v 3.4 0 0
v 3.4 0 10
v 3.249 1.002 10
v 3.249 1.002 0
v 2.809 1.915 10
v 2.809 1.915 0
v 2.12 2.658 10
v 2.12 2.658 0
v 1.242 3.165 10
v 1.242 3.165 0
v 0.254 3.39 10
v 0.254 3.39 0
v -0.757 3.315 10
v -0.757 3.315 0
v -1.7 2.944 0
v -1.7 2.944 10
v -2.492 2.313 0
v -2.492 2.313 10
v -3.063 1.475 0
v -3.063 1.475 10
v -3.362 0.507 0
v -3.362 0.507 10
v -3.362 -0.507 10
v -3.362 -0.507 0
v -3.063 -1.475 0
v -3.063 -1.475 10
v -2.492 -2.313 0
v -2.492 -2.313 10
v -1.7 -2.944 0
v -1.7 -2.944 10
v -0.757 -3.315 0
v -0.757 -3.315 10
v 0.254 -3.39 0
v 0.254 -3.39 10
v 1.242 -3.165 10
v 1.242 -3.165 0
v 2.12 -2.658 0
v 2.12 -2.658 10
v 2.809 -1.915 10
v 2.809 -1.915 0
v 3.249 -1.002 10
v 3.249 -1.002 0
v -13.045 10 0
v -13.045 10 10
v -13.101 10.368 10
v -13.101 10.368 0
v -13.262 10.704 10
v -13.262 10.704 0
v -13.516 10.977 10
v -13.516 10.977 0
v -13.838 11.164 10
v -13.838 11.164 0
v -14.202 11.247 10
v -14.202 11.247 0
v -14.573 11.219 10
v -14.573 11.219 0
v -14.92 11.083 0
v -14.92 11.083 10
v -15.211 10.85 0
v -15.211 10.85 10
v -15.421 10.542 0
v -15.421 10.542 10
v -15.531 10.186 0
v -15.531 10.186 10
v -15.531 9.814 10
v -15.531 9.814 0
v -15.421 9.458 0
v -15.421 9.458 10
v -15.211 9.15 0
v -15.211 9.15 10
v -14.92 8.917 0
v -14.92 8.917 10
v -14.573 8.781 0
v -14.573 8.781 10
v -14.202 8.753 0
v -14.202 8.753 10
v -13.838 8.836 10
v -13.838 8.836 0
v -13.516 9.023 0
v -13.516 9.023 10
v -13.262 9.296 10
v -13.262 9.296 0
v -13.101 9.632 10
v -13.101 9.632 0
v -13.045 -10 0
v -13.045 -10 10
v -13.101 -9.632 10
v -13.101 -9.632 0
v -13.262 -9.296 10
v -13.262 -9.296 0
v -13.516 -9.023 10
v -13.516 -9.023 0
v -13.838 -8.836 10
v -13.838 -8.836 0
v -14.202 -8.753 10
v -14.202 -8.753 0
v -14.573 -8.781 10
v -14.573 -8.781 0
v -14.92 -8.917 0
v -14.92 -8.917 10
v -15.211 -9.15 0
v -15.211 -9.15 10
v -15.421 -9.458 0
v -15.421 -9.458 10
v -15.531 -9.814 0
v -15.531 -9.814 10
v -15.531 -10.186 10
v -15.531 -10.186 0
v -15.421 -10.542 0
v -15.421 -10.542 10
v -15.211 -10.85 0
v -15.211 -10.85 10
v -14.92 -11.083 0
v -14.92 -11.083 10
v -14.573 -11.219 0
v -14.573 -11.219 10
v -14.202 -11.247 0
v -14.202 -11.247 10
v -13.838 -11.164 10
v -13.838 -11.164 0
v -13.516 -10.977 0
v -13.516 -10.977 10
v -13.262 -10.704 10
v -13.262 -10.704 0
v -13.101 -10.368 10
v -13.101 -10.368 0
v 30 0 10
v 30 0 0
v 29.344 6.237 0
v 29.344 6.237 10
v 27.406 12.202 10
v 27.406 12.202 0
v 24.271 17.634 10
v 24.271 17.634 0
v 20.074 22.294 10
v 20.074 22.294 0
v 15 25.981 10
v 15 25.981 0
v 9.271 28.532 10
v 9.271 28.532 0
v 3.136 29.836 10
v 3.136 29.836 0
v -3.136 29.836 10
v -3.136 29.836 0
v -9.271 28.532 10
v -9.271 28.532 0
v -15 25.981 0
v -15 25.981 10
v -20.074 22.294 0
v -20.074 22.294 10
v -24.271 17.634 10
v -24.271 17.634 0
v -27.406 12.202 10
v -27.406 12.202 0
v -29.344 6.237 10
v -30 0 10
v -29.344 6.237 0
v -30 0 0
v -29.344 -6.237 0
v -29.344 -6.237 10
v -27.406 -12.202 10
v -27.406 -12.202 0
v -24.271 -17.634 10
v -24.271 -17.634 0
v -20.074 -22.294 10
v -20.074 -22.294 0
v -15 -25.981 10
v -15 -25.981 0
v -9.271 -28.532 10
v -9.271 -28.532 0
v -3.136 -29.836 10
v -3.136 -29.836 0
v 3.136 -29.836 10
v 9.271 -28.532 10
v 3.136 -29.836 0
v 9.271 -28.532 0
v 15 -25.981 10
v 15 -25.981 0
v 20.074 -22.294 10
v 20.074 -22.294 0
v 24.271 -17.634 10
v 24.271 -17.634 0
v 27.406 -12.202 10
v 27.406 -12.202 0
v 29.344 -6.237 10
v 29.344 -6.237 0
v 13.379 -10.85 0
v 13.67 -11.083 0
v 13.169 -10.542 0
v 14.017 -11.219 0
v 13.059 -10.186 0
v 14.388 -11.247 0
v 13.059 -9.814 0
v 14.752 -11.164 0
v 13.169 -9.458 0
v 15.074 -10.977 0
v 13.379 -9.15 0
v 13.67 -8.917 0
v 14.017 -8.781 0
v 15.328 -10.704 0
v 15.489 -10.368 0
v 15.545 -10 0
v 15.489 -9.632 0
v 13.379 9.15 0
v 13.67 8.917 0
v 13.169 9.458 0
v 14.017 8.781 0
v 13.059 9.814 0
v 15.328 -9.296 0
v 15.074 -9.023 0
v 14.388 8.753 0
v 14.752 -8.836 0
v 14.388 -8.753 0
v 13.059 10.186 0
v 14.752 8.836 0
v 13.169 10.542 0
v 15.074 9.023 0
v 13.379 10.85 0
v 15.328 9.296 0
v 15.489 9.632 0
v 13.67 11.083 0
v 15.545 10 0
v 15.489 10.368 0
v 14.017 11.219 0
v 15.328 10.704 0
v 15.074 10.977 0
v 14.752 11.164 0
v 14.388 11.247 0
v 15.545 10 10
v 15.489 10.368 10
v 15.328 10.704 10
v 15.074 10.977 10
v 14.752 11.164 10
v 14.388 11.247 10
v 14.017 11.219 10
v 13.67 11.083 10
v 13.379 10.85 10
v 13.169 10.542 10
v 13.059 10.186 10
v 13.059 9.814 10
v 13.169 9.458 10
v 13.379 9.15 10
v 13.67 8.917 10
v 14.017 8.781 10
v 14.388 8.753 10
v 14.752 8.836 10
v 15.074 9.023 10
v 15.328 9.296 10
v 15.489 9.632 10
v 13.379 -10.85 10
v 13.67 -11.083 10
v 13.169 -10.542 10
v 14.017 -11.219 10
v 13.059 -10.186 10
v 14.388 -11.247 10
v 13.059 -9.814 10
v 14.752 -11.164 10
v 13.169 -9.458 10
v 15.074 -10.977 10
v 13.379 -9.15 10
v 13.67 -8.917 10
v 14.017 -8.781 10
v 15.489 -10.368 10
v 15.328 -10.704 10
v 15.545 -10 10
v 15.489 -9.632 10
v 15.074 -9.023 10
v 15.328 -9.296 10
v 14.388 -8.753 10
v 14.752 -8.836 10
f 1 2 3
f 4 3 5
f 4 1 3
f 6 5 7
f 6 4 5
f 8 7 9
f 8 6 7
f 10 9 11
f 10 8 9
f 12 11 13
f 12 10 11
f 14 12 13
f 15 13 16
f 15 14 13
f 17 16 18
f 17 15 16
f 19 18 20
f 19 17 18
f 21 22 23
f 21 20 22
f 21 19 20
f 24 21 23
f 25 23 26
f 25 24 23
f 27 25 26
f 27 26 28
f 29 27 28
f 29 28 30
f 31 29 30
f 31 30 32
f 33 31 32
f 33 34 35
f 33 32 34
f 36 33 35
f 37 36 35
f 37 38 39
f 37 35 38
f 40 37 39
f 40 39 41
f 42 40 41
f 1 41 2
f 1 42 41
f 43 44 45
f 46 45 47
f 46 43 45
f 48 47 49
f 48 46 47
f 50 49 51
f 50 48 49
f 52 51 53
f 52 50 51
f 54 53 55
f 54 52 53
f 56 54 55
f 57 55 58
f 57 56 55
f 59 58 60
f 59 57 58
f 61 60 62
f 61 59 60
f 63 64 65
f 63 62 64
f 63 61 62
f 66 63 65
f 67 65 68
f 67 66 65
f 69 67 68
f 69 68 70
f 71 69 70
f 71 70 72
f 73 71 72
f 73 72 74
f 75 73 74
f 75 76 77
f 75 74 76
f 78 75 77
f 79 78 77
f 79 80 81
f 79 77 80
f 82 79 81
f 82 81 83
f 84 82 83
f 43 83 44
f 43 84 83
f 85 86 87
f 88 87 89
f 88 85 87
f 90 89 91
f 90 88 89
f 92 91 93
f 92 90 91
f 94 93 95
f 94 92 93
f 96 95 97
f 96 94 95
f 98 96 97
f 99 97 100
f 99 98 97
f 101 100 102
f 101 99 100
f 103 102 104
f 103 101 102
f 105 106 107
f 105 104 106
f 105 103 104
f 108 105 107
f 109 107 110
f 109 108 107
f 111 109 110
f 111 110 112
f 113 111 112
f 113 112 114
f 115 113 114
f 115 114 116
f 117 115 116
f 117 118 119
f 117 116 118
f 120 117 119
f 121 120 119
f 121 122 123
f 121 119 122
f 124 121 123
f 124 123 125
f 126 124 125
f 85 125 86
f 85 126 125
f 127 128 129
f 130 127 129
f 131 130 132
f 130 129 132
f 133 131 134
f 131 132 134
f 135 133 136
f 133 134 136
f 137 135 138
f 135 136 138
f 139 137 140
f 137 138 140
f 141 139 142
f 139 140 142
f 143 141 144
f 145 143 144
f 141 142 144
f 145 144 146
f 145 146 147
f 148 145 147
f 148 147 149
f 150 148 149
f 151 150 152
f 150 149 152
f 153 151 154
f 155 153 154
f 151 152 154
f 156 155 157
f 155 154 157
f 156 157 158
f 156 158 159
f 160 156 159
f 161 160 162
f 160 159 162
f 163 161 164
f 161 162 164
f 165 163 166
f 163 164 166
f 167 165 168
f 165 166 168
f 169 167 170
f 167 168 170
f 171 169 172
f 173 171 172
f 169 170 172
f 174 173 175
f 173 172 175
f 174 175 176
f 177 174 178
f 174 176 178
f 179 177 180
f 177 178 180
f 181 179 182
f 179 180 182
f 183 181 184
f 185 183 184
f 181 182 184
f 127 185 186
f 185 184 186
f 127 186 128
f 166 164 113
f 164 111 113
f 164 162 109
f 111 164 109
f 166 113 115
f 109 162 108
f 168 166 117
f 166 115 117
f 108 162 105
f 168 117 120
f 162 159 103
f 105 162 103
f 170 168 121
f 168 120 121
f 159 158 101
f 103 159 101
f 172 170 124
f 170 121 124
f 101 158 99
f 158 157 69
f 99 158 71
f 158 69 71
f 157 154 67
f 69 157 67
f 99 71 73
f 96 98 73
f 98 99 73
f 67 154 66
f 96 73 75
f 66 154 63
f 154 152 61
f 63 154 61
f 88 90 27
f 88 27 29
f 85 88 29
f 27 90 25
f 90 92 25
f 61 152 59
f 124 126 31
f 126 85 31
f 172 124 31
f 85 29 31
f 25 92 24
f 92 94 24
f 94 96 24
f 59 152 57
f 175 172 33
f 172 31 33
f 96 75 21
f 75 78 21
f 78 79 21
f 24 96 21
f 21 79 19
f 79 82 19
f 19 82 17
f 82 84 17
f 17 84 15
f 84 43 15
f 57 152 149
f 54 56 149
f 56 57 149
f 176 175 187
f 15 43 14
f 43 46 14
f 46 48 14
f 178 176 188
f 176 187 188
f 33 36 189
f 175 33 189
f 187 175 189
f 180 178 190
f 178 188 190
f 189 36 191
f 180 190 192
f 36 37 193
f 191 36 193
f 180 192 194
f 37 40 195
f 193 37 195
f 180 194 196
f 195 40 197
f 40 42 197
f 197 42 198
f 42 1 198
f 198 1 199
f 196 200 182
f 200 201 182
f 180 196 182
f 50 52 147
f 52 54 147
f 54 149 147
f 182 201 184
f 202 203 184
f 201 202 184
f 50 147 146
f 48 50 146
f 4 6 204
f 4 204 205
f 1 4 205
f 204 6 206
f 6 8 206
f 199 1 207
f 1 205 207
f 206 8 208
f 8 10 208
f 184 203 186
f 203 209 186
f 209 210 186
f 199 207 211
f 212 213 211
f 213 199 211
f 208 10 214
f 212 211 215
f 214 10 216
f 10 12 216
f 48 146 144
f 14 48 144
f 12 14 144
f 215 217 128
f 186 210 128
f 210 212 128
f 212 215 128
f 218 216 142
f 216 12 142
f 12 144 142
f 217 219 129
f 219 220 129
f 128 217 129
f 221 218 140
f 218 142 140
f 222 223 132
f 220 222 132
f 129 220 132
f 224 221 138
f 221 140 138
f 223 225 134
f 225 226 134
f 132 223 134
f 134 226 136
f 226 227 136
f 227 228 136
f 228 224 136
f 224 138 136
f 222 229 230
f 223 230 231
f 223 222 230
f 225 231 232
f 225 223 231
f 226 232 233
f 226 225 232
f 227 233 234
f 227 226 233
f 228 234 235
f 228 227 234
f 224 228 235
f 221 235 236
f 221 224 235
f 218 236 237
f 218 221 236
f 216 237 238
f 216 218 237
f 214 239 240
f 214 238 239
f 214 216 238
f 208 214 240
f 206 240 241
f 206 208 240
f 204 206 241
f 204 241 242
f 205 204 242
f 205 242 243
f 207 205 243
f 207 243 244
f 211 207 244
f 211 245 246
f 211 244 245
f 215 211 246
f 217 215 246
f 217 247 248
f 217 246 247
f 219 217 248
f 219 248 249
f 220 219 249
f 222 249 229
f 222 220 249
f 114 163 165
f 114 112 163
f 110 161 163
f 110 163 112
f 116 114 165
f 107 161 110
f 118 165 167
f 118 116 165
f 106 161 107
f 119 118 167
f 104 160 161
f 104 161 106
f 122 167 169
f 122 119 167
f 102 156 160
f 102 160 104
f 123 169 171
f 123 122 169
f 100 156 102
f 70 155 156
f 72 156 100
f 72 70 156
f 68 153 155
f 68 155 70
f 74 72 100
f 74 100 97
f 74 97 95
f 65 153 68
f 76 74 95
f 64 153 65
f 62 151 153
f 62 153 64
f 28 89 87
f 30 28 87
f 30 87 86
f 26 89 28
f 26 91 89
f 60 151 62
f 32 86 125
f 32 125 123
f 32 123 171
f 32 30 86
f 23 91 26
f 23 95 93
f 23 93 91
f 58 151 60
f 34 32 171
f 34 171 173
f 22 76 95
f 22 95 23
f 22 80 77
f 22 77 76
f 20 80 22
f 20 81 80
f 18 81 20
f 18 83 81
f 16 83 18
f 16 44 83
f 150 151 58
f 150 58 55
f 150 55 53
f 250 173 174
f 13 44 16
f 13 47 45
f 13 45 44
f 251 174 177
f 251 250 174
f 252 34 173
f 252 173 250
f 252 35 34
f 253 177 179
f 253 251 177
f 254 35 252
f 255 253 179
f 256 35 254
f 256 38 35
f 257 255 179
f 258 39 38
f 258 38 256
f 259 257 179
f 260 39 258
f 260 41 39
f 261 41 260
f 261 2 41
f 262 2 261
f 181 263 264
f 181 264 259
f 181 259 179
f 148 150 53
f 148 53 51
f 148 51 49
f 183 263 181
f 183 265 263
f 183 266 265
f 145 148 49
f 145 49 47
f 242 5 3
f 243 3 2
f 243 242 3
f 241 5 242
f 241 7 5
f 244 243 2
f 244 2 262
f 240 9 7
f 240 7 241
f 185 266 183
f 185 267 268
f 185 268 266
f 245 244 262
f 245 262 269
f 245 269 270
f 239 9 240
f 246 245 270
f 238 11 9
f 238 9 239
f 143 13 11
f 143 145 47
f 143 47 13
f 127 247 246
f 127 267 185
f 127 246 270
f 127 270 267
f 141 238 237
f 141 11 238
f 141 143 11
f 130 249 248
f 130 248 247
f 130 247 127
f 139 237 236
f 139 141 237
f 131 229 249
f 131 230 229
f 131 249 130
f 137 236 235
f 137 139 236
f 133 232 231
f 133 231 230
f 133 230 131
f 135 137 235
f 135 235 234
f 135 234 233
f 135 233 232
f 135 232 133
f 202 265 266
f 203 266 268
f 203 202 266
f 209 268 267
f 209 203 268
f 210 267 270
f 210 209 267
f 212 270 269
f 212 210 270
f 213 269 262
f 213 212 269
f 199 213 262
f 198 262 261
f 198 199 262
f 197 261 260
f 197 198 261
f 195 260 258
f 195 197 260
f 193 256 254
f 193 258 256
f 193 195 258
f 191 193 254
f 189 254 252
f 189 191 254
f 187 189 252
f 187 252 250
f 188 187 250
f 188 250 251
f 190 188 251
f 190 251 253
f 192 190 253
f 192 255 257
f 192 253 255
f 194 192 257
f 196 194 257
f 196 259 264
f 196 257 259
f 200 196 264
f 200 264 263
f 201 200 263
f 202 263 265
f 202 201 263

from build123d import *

# Parameters (mm, degrees)
SKETCH_R      = 30
PAD_DEPTH     = 10
SKETCH001_R   = 3.4
HOLE_DEPTH    = 10.001
SKETCH002_R   = 1.25
HOLE001_DEPTH = 10.001


with BuildPart() as part:
    # Sketch → Pad (new body)
    with BuildSketch(Plane.XY):
        Circle(SKETCH_R)
    extrude(amount=PAD_DEPTH)

    # Sketch001 → Hole (cut, through all)
    with BuildSketch(Plane.XY):
        Circle(SKETCH001_R)
    extrude(amount=HOLE_DEPTH, mode=Mode.SUBTRACT)

    # Sketch002 → Hole001 (cut, through all)
    with BuildSketch(Plane.XY):
        with Locations((-14.295, 10)):
            Circle(SKETCH002_R)
        with Locations((14.295, 10)):
            Circle(SKETCH002_R)
        with Locations((14.295, -10)):
            Circle(SKETCH002_R)
        with Locations((-14.295, -10)):
            Circle(SKETCH002_R)
    extrude(amount=HOLE001_DEPTH, mode=Mode.SUBTRACT)


solid = part.part
